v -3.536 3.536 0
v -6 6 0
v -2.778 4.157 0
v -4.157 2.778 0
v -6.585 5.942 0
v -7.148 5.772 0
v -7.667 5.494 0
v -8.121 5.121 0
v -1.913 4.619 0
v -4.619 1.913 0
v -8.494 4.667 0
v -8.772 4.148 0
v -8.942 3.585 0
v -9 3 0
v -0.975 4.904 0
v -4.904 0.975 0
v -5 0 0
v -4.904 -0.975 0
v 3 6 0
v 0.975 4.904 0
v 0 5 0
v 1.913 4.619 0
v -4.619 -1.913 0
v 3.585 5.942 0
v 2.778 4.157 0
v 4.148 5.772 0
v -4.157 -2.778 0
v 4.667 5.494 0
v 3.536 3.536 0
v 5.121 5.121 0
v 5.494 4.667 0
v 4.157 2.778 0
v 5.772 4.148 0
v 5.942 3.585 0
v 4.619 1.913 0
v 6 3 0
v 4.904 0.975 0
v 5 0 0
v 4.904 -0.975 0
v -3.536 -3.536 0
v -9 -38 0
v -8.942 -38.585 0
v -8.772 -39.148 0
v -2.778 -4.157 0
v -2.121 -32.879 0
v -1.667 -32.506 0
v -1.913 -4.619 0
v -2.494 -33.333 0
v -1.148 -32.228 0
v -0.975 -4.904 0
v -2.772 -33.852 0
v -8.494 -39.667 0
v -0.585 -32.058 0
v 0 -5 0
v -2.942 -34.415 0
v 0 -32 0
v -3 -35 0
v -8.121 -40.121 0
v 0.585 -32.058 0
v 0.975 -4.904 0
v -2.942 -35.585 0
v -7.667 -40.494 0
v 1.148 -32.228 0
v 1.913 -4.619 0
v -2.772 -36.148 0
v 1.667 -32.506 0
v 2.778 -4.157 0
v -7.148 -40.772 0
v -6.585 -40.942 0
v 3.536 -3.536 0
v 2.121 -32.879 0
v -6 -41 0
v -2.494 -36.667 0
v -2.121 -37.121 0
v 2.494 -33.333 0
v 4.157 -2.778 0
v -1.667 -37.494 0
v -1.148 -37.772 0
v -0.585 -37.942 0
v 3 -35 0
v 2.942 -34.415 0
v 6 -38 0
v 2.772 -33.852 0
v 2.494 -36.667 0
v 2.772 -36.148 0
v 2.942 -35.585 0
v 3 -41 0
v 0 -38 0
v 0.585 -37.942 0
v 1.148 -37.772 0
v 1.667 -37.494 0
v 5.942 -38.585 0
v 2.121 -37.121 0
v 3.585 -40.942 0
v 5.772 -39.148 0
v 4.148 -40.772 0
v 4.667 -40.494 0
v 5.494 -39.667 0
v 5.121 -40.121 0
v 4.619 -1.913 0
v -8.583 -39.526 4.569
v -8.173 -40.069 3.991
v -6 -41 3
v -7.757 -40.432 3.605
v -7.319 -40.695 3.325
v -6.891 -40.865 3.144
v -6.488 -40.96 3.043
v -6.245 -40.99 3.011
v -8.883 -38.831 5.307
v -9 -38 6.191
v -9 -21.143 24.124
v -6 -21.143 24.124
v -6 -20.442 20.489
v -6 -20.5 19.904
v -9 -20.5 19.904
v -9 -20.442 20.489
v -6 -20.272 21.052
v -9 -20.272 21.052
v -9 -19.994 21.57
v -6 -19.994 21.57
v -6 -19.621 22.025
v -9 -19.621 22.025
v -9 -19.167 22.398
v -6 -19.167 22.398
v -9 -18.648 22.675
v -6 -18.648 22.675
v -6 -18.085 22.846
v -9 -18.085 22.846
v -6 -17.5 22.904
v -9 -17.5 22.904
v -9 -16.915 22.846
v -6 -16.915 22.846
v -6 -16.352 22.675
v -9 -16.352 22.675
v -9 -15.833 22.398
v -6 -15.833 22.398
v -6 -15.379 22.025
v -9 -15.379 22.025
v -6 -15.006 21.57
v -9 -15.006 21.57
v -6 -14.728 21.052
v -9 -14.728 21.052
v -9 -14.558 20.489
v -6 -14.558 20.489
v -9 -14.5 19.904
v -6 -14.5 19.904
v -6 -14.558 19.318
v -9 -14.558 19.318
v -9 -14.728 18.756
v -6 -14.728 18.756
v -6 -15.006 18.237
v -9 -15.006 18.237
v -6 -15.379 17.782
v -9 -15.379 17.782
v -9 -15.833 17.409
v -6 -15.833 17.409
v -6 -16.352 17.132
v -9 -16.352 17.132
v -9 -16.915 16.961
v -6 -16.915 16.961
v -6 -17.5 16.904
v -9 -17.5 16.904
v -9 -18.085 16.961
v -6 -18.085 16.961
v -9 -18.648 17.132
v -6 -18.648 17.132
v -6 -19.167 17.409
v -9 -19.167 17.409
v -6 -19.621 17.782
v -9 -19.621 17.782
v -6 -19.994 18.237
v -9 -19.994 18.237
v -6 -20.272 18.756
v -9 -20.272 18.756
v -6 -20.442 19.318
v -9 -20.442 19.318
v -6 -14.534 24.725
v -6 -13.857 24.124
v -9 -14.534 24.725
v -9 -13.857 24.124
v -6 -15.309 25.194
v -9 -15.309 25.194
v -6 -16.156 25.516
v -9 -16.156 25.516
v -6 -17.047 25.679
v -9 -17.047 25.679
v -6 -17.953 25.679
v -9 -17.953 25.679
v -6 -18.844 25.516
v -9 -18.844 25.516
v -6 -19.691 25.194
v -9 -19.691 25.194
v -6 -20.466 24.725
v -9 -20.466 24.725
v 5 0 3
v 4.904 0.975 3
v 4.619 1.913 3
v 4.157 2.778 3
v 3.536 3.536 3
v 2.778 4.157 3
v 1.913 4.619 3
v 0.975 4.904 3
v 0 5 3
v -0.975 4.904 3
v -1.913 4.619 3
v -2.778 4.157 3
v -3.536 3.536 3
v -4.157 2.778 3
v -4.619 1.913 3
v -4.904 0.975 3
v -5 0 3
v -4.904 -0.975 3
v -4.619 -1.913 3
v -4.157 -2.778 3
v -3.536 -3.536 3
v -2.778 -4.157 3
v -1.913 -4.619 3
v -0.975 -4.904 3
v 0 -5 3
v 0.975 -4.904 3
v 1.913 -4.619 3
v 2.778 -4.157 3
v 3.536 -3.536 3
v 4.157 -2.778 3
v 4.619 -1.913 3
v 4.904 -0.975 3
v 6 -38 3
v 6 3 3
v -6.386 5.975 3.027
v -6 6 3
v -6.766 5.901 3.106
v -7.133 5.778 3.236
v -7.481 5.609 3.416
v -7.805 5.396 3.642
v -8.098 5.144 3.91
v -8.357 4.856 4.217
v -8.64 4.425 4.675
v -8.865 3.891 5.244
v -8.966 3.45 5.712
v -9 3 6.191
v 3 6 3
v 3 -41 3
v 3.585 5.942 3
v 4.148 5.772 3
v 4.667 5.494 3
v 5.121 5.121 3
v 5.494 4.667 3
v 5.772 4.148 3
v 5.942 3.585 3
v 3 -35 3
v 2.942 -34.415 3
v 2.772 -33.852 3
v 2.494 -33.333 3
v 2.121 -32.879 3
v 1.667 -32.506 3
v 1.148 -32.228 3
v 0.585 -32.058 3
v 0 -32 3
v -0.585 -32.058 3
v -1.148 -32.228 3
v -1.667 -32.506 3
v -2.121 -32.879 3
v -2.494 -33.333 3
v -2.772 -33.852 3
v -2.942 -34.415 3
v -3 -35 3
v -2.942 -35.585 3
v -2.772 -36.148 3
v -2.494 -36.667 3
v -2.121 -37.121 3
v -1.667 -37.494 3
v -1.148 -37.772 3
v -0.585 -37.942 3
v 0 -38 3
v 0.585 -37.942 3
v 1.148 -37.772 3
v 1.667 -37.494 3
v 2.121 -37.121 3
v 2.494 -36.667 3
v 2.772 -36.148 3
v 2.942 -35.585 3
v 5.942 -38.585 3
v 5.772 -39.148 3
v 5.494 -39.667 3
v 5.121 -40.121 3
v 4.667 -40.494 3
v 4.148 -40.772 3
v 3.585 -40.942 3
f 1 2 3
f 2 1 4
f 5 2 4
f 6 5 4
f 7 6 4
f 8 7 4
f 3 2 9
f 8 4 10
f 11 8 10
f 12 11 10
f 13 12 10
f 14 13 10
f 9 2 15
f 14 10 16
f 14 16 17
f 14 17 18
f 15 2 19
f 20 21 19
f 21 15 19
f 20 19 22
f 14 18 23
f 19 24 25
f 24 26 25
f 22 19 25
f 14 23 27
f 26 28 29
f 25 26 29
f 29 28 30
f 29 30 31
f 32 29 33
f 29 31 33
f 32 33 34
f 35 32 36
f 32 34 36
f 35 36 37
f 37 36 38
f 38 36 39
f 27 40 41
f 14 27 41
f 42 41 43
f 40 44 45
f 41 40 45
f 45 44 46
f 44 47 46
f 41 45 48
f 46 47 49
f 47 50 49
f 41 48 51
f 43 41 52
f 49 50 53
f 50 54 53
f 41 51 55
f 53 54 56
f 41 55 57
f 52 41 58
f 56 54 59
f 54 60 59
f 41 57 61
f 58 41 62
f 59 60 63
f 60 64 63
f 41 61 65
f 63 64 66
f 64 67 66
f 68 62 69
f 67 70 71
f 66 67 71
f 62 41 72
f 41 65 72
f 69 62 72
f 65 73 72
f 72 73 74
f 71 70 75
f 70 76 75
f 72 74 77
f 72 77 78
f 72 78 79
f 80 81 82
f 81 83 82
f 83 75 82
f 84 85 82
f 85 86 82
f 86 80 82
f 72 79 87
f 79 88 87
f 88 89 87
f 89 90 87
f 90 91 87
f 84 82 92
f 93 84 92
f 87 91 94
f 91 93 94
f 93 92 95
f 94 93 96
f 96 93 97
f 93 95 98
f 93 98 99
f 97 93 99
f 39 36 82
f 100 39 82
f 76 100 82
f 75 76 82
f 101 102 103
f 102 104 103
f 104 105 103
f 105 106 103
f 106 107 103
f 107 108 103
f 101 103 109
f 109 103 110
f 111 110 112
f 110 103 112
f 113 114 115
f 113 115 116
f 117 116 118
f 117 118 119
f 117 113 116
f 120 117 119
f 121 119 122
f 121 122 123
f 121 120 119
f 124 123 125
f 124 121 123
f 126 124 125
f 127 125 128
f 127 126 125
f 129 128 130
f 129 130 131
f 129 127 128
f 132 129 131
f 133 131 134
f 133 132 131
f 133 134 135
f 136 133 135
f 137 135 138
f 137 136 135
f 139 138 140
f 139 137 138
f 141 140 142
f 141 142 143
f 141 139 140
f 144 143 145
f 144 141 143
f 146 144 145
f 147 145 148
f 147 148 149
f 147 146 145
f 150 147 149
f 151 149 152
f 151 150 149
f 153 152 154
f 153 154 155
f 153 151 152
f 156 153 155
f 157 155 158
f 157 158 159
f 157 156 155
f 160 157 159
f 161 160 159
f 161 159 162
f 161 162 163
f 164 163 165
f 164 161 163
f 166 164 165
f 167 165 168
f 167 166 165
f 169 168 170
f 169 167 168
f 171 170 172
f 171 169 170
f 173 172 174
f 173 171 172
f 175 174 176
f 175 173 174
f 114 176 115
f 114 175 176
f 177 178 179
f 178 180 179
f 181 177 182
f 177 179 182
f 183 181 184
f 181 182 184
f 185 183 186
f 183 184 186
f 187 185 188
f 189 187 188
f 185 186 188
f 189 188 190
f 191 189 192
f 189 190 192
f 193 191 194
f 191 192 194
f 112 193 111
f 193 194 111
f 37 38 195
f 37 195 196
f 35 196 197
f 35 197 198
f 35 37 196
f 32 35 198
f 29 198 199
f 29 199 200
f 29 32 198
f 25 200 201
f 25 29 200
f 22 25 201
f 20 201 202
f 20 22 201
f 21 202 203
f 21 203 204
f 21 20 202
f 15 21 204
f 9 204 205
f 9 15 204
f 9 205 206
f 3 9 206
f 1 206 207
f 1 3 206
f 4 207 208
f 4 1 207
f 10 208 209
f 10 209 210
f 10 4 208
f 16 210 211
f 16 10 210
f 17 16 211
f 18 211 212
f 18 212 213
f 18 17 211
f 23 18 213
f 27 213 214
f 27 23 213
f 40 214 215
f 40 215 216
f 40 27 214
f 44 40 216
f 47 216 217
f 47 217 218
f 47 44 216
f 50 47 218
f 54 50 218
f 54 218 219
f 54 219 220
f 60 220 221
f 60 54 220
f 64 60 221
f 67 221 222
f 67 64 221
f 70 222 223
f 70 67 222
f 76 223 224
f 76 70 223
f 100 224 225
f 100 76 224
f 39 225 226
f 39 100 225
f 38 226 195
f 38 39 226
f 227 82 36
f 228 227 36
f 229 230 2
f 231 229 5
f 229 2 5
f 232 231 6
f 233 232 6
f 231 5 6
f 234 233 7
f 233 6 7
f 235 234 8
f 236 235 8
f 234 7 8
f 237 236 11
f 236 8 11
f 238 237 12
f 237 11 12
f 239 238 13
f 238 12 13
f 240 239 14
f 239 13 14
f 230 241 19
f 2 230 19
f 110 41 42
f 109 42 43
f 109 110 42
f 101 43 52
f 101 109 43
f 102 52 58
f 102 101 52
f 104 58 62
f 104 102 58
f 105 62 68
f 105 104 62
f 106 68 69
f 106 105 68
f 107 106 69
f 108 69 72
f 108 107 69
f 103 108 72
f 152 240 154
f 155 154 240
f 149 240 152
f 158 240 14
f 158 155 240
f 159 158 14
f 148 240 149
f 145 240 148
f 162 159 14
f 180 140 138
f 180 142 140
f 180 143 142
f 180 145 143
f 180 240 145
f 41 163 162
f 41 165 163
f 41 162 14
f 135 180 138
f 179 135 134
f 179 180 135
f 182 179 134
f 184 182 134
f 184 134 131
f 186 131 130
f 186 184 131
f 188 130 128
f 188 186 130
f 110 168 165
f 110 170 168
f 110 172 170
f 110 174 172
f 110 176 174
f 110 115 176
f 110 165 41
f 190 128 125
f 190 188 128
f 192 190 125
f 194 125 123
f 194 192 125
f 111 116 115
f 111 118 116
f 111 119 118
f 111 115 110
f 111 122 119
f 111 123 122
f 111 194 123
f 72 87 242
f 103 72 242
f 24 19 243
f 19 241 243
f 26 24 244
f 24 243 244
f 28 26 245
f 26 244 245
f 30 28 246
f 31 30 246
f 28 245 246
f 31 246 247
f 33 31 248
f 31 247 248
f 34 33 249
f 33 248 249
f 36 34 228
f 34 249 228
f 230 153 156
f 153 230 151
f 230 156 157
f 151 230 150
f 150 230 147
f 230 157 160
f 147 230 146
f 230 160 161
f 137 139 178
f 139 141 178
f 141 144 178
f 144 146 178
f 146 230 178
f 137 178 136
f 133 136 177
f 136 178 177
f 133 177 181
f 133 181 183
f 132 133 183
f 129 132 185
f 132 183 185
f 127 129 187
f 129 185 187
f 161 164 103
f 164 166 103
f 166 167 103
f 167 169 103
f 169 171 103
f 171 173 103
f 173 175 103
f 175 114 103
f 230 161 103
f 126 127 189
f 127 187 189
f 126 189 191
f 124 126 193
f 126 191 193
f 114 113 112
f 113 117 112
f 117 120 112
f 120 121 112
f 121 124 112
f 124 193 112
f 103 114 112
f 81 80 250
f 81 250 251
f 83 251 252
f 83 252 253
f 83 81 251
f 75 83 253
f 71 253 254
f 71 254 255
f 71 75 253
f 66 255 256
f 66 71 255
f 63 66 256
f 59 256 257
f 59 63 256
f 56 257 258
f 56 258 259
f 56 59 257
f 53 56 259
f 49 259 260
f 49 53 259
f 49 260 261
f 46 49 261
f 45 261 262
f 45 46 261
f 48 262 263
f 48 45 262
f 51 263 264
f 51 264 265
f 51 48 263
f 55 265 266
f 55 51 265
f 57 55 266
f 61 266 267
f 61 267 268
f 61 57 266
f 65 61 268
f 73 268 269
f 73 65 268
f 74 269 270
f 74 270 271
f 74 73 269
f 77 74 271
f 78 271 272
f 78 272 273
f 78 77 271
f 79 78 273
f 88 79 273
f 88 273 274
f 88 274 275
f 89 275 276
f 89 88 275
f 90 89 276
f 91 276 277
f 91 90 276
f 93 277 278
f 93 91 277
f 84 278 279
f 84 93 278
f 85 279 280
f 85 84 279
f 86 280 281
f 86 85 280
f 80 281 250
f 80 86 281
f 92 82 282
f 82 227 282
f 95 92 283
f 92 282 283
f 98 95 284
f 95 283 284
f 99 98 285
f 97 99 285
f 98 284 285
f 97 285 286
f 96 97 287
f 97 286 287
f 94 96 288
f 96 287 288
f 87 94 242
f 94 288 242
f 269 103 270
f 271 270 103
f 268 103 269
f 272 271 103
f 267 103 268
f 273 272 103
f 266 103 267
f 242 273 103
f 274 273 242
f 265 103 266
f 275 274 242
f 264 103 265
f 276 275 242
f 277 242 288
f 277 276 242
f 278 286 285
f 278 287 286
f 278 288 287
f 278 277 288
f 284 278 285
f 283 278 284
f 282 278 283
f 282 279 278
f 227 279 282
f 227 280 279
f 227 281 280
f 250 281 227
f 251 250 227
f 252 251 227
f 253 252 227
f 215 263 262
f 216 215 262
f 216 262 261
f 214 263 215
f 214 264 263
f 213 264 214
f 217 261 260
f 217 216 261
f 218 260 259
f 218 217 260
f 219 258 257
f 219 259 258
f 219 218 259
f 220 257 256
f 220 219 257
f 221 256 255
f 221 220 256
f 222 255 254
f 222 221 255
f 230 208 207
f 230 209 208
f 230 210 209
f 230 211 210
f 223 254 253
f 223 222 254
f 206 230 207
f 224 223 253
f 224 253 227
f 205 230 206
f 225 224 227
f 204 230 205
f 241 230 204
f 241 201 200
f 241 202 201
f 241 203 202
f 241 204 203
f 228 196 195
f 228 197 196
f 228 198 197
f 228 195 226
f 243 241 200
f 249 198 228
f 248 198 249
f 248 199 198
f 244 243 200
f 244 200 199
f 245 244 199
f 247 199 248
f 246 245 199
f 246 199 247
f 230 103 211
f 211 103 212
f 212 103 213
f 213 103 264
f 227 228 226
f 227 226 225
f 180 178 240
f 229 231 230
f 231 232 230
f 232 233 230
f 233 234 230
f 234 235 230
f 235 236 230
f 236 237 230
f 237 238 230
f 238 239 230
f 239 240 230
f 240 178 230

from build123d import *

# Parameters (mm, degrees)
F0_R     = 3
F0_R_2   = 5
F1_DEPTH = 3
F2_R     = 3
F3_DEPTH = 3
F4_R     = 5
F5_R     = 3


with BuildPart() as f1:
    # F0 (on Top) → F1 (new body)
    with BuildSketch(Plane.XY):
        Polygon((6, 6), (0, 6), (-6, 6), (-6, -41), (0, -41), (6, -41), align=None)
        with Locations((0, -35)):
            Circle(F0_R, mode=Mode.SUBTRACT)
        Circle(F0_R_2, mode=Mode.SUBTRACT)
    extrude(amount=F1_DEPTH)

    # F2 (on face) → F3 (join)
    with BuildSketch(Plane(origin=(-6, 0, 0), x_dir=(0, -1, 0), z_dir=(-1, 0, 0))):
        Polygon((17.5, 28), (-6, 3), (-6, 0), (41, 0), (41, 3), align=None)
        with Locations((17.5, 19.903563)):
            Circle(F2_R, mode=Mode.SUBTRACT)
    extrude(amount=F3_DEPTH)

    # F4
    f4_edges = [f1.edges().sort_by_distance(p)[0] for p in [
        (-7.5, -17.5, 28),
    ]]
    fillet(f4_edges, radius=F4_R)

    # F5
    f5_edges = [f1.edges().sort_by_distance(p)[0] for p in [
        (6, -41, 1.5),
        (-9, -41, 1.5),
        (6, 6, 1.5),
        (-9, 6, 1.5),
    ]]
    fillet(f5_edges, radius=F5_R)


solid = f1.part
